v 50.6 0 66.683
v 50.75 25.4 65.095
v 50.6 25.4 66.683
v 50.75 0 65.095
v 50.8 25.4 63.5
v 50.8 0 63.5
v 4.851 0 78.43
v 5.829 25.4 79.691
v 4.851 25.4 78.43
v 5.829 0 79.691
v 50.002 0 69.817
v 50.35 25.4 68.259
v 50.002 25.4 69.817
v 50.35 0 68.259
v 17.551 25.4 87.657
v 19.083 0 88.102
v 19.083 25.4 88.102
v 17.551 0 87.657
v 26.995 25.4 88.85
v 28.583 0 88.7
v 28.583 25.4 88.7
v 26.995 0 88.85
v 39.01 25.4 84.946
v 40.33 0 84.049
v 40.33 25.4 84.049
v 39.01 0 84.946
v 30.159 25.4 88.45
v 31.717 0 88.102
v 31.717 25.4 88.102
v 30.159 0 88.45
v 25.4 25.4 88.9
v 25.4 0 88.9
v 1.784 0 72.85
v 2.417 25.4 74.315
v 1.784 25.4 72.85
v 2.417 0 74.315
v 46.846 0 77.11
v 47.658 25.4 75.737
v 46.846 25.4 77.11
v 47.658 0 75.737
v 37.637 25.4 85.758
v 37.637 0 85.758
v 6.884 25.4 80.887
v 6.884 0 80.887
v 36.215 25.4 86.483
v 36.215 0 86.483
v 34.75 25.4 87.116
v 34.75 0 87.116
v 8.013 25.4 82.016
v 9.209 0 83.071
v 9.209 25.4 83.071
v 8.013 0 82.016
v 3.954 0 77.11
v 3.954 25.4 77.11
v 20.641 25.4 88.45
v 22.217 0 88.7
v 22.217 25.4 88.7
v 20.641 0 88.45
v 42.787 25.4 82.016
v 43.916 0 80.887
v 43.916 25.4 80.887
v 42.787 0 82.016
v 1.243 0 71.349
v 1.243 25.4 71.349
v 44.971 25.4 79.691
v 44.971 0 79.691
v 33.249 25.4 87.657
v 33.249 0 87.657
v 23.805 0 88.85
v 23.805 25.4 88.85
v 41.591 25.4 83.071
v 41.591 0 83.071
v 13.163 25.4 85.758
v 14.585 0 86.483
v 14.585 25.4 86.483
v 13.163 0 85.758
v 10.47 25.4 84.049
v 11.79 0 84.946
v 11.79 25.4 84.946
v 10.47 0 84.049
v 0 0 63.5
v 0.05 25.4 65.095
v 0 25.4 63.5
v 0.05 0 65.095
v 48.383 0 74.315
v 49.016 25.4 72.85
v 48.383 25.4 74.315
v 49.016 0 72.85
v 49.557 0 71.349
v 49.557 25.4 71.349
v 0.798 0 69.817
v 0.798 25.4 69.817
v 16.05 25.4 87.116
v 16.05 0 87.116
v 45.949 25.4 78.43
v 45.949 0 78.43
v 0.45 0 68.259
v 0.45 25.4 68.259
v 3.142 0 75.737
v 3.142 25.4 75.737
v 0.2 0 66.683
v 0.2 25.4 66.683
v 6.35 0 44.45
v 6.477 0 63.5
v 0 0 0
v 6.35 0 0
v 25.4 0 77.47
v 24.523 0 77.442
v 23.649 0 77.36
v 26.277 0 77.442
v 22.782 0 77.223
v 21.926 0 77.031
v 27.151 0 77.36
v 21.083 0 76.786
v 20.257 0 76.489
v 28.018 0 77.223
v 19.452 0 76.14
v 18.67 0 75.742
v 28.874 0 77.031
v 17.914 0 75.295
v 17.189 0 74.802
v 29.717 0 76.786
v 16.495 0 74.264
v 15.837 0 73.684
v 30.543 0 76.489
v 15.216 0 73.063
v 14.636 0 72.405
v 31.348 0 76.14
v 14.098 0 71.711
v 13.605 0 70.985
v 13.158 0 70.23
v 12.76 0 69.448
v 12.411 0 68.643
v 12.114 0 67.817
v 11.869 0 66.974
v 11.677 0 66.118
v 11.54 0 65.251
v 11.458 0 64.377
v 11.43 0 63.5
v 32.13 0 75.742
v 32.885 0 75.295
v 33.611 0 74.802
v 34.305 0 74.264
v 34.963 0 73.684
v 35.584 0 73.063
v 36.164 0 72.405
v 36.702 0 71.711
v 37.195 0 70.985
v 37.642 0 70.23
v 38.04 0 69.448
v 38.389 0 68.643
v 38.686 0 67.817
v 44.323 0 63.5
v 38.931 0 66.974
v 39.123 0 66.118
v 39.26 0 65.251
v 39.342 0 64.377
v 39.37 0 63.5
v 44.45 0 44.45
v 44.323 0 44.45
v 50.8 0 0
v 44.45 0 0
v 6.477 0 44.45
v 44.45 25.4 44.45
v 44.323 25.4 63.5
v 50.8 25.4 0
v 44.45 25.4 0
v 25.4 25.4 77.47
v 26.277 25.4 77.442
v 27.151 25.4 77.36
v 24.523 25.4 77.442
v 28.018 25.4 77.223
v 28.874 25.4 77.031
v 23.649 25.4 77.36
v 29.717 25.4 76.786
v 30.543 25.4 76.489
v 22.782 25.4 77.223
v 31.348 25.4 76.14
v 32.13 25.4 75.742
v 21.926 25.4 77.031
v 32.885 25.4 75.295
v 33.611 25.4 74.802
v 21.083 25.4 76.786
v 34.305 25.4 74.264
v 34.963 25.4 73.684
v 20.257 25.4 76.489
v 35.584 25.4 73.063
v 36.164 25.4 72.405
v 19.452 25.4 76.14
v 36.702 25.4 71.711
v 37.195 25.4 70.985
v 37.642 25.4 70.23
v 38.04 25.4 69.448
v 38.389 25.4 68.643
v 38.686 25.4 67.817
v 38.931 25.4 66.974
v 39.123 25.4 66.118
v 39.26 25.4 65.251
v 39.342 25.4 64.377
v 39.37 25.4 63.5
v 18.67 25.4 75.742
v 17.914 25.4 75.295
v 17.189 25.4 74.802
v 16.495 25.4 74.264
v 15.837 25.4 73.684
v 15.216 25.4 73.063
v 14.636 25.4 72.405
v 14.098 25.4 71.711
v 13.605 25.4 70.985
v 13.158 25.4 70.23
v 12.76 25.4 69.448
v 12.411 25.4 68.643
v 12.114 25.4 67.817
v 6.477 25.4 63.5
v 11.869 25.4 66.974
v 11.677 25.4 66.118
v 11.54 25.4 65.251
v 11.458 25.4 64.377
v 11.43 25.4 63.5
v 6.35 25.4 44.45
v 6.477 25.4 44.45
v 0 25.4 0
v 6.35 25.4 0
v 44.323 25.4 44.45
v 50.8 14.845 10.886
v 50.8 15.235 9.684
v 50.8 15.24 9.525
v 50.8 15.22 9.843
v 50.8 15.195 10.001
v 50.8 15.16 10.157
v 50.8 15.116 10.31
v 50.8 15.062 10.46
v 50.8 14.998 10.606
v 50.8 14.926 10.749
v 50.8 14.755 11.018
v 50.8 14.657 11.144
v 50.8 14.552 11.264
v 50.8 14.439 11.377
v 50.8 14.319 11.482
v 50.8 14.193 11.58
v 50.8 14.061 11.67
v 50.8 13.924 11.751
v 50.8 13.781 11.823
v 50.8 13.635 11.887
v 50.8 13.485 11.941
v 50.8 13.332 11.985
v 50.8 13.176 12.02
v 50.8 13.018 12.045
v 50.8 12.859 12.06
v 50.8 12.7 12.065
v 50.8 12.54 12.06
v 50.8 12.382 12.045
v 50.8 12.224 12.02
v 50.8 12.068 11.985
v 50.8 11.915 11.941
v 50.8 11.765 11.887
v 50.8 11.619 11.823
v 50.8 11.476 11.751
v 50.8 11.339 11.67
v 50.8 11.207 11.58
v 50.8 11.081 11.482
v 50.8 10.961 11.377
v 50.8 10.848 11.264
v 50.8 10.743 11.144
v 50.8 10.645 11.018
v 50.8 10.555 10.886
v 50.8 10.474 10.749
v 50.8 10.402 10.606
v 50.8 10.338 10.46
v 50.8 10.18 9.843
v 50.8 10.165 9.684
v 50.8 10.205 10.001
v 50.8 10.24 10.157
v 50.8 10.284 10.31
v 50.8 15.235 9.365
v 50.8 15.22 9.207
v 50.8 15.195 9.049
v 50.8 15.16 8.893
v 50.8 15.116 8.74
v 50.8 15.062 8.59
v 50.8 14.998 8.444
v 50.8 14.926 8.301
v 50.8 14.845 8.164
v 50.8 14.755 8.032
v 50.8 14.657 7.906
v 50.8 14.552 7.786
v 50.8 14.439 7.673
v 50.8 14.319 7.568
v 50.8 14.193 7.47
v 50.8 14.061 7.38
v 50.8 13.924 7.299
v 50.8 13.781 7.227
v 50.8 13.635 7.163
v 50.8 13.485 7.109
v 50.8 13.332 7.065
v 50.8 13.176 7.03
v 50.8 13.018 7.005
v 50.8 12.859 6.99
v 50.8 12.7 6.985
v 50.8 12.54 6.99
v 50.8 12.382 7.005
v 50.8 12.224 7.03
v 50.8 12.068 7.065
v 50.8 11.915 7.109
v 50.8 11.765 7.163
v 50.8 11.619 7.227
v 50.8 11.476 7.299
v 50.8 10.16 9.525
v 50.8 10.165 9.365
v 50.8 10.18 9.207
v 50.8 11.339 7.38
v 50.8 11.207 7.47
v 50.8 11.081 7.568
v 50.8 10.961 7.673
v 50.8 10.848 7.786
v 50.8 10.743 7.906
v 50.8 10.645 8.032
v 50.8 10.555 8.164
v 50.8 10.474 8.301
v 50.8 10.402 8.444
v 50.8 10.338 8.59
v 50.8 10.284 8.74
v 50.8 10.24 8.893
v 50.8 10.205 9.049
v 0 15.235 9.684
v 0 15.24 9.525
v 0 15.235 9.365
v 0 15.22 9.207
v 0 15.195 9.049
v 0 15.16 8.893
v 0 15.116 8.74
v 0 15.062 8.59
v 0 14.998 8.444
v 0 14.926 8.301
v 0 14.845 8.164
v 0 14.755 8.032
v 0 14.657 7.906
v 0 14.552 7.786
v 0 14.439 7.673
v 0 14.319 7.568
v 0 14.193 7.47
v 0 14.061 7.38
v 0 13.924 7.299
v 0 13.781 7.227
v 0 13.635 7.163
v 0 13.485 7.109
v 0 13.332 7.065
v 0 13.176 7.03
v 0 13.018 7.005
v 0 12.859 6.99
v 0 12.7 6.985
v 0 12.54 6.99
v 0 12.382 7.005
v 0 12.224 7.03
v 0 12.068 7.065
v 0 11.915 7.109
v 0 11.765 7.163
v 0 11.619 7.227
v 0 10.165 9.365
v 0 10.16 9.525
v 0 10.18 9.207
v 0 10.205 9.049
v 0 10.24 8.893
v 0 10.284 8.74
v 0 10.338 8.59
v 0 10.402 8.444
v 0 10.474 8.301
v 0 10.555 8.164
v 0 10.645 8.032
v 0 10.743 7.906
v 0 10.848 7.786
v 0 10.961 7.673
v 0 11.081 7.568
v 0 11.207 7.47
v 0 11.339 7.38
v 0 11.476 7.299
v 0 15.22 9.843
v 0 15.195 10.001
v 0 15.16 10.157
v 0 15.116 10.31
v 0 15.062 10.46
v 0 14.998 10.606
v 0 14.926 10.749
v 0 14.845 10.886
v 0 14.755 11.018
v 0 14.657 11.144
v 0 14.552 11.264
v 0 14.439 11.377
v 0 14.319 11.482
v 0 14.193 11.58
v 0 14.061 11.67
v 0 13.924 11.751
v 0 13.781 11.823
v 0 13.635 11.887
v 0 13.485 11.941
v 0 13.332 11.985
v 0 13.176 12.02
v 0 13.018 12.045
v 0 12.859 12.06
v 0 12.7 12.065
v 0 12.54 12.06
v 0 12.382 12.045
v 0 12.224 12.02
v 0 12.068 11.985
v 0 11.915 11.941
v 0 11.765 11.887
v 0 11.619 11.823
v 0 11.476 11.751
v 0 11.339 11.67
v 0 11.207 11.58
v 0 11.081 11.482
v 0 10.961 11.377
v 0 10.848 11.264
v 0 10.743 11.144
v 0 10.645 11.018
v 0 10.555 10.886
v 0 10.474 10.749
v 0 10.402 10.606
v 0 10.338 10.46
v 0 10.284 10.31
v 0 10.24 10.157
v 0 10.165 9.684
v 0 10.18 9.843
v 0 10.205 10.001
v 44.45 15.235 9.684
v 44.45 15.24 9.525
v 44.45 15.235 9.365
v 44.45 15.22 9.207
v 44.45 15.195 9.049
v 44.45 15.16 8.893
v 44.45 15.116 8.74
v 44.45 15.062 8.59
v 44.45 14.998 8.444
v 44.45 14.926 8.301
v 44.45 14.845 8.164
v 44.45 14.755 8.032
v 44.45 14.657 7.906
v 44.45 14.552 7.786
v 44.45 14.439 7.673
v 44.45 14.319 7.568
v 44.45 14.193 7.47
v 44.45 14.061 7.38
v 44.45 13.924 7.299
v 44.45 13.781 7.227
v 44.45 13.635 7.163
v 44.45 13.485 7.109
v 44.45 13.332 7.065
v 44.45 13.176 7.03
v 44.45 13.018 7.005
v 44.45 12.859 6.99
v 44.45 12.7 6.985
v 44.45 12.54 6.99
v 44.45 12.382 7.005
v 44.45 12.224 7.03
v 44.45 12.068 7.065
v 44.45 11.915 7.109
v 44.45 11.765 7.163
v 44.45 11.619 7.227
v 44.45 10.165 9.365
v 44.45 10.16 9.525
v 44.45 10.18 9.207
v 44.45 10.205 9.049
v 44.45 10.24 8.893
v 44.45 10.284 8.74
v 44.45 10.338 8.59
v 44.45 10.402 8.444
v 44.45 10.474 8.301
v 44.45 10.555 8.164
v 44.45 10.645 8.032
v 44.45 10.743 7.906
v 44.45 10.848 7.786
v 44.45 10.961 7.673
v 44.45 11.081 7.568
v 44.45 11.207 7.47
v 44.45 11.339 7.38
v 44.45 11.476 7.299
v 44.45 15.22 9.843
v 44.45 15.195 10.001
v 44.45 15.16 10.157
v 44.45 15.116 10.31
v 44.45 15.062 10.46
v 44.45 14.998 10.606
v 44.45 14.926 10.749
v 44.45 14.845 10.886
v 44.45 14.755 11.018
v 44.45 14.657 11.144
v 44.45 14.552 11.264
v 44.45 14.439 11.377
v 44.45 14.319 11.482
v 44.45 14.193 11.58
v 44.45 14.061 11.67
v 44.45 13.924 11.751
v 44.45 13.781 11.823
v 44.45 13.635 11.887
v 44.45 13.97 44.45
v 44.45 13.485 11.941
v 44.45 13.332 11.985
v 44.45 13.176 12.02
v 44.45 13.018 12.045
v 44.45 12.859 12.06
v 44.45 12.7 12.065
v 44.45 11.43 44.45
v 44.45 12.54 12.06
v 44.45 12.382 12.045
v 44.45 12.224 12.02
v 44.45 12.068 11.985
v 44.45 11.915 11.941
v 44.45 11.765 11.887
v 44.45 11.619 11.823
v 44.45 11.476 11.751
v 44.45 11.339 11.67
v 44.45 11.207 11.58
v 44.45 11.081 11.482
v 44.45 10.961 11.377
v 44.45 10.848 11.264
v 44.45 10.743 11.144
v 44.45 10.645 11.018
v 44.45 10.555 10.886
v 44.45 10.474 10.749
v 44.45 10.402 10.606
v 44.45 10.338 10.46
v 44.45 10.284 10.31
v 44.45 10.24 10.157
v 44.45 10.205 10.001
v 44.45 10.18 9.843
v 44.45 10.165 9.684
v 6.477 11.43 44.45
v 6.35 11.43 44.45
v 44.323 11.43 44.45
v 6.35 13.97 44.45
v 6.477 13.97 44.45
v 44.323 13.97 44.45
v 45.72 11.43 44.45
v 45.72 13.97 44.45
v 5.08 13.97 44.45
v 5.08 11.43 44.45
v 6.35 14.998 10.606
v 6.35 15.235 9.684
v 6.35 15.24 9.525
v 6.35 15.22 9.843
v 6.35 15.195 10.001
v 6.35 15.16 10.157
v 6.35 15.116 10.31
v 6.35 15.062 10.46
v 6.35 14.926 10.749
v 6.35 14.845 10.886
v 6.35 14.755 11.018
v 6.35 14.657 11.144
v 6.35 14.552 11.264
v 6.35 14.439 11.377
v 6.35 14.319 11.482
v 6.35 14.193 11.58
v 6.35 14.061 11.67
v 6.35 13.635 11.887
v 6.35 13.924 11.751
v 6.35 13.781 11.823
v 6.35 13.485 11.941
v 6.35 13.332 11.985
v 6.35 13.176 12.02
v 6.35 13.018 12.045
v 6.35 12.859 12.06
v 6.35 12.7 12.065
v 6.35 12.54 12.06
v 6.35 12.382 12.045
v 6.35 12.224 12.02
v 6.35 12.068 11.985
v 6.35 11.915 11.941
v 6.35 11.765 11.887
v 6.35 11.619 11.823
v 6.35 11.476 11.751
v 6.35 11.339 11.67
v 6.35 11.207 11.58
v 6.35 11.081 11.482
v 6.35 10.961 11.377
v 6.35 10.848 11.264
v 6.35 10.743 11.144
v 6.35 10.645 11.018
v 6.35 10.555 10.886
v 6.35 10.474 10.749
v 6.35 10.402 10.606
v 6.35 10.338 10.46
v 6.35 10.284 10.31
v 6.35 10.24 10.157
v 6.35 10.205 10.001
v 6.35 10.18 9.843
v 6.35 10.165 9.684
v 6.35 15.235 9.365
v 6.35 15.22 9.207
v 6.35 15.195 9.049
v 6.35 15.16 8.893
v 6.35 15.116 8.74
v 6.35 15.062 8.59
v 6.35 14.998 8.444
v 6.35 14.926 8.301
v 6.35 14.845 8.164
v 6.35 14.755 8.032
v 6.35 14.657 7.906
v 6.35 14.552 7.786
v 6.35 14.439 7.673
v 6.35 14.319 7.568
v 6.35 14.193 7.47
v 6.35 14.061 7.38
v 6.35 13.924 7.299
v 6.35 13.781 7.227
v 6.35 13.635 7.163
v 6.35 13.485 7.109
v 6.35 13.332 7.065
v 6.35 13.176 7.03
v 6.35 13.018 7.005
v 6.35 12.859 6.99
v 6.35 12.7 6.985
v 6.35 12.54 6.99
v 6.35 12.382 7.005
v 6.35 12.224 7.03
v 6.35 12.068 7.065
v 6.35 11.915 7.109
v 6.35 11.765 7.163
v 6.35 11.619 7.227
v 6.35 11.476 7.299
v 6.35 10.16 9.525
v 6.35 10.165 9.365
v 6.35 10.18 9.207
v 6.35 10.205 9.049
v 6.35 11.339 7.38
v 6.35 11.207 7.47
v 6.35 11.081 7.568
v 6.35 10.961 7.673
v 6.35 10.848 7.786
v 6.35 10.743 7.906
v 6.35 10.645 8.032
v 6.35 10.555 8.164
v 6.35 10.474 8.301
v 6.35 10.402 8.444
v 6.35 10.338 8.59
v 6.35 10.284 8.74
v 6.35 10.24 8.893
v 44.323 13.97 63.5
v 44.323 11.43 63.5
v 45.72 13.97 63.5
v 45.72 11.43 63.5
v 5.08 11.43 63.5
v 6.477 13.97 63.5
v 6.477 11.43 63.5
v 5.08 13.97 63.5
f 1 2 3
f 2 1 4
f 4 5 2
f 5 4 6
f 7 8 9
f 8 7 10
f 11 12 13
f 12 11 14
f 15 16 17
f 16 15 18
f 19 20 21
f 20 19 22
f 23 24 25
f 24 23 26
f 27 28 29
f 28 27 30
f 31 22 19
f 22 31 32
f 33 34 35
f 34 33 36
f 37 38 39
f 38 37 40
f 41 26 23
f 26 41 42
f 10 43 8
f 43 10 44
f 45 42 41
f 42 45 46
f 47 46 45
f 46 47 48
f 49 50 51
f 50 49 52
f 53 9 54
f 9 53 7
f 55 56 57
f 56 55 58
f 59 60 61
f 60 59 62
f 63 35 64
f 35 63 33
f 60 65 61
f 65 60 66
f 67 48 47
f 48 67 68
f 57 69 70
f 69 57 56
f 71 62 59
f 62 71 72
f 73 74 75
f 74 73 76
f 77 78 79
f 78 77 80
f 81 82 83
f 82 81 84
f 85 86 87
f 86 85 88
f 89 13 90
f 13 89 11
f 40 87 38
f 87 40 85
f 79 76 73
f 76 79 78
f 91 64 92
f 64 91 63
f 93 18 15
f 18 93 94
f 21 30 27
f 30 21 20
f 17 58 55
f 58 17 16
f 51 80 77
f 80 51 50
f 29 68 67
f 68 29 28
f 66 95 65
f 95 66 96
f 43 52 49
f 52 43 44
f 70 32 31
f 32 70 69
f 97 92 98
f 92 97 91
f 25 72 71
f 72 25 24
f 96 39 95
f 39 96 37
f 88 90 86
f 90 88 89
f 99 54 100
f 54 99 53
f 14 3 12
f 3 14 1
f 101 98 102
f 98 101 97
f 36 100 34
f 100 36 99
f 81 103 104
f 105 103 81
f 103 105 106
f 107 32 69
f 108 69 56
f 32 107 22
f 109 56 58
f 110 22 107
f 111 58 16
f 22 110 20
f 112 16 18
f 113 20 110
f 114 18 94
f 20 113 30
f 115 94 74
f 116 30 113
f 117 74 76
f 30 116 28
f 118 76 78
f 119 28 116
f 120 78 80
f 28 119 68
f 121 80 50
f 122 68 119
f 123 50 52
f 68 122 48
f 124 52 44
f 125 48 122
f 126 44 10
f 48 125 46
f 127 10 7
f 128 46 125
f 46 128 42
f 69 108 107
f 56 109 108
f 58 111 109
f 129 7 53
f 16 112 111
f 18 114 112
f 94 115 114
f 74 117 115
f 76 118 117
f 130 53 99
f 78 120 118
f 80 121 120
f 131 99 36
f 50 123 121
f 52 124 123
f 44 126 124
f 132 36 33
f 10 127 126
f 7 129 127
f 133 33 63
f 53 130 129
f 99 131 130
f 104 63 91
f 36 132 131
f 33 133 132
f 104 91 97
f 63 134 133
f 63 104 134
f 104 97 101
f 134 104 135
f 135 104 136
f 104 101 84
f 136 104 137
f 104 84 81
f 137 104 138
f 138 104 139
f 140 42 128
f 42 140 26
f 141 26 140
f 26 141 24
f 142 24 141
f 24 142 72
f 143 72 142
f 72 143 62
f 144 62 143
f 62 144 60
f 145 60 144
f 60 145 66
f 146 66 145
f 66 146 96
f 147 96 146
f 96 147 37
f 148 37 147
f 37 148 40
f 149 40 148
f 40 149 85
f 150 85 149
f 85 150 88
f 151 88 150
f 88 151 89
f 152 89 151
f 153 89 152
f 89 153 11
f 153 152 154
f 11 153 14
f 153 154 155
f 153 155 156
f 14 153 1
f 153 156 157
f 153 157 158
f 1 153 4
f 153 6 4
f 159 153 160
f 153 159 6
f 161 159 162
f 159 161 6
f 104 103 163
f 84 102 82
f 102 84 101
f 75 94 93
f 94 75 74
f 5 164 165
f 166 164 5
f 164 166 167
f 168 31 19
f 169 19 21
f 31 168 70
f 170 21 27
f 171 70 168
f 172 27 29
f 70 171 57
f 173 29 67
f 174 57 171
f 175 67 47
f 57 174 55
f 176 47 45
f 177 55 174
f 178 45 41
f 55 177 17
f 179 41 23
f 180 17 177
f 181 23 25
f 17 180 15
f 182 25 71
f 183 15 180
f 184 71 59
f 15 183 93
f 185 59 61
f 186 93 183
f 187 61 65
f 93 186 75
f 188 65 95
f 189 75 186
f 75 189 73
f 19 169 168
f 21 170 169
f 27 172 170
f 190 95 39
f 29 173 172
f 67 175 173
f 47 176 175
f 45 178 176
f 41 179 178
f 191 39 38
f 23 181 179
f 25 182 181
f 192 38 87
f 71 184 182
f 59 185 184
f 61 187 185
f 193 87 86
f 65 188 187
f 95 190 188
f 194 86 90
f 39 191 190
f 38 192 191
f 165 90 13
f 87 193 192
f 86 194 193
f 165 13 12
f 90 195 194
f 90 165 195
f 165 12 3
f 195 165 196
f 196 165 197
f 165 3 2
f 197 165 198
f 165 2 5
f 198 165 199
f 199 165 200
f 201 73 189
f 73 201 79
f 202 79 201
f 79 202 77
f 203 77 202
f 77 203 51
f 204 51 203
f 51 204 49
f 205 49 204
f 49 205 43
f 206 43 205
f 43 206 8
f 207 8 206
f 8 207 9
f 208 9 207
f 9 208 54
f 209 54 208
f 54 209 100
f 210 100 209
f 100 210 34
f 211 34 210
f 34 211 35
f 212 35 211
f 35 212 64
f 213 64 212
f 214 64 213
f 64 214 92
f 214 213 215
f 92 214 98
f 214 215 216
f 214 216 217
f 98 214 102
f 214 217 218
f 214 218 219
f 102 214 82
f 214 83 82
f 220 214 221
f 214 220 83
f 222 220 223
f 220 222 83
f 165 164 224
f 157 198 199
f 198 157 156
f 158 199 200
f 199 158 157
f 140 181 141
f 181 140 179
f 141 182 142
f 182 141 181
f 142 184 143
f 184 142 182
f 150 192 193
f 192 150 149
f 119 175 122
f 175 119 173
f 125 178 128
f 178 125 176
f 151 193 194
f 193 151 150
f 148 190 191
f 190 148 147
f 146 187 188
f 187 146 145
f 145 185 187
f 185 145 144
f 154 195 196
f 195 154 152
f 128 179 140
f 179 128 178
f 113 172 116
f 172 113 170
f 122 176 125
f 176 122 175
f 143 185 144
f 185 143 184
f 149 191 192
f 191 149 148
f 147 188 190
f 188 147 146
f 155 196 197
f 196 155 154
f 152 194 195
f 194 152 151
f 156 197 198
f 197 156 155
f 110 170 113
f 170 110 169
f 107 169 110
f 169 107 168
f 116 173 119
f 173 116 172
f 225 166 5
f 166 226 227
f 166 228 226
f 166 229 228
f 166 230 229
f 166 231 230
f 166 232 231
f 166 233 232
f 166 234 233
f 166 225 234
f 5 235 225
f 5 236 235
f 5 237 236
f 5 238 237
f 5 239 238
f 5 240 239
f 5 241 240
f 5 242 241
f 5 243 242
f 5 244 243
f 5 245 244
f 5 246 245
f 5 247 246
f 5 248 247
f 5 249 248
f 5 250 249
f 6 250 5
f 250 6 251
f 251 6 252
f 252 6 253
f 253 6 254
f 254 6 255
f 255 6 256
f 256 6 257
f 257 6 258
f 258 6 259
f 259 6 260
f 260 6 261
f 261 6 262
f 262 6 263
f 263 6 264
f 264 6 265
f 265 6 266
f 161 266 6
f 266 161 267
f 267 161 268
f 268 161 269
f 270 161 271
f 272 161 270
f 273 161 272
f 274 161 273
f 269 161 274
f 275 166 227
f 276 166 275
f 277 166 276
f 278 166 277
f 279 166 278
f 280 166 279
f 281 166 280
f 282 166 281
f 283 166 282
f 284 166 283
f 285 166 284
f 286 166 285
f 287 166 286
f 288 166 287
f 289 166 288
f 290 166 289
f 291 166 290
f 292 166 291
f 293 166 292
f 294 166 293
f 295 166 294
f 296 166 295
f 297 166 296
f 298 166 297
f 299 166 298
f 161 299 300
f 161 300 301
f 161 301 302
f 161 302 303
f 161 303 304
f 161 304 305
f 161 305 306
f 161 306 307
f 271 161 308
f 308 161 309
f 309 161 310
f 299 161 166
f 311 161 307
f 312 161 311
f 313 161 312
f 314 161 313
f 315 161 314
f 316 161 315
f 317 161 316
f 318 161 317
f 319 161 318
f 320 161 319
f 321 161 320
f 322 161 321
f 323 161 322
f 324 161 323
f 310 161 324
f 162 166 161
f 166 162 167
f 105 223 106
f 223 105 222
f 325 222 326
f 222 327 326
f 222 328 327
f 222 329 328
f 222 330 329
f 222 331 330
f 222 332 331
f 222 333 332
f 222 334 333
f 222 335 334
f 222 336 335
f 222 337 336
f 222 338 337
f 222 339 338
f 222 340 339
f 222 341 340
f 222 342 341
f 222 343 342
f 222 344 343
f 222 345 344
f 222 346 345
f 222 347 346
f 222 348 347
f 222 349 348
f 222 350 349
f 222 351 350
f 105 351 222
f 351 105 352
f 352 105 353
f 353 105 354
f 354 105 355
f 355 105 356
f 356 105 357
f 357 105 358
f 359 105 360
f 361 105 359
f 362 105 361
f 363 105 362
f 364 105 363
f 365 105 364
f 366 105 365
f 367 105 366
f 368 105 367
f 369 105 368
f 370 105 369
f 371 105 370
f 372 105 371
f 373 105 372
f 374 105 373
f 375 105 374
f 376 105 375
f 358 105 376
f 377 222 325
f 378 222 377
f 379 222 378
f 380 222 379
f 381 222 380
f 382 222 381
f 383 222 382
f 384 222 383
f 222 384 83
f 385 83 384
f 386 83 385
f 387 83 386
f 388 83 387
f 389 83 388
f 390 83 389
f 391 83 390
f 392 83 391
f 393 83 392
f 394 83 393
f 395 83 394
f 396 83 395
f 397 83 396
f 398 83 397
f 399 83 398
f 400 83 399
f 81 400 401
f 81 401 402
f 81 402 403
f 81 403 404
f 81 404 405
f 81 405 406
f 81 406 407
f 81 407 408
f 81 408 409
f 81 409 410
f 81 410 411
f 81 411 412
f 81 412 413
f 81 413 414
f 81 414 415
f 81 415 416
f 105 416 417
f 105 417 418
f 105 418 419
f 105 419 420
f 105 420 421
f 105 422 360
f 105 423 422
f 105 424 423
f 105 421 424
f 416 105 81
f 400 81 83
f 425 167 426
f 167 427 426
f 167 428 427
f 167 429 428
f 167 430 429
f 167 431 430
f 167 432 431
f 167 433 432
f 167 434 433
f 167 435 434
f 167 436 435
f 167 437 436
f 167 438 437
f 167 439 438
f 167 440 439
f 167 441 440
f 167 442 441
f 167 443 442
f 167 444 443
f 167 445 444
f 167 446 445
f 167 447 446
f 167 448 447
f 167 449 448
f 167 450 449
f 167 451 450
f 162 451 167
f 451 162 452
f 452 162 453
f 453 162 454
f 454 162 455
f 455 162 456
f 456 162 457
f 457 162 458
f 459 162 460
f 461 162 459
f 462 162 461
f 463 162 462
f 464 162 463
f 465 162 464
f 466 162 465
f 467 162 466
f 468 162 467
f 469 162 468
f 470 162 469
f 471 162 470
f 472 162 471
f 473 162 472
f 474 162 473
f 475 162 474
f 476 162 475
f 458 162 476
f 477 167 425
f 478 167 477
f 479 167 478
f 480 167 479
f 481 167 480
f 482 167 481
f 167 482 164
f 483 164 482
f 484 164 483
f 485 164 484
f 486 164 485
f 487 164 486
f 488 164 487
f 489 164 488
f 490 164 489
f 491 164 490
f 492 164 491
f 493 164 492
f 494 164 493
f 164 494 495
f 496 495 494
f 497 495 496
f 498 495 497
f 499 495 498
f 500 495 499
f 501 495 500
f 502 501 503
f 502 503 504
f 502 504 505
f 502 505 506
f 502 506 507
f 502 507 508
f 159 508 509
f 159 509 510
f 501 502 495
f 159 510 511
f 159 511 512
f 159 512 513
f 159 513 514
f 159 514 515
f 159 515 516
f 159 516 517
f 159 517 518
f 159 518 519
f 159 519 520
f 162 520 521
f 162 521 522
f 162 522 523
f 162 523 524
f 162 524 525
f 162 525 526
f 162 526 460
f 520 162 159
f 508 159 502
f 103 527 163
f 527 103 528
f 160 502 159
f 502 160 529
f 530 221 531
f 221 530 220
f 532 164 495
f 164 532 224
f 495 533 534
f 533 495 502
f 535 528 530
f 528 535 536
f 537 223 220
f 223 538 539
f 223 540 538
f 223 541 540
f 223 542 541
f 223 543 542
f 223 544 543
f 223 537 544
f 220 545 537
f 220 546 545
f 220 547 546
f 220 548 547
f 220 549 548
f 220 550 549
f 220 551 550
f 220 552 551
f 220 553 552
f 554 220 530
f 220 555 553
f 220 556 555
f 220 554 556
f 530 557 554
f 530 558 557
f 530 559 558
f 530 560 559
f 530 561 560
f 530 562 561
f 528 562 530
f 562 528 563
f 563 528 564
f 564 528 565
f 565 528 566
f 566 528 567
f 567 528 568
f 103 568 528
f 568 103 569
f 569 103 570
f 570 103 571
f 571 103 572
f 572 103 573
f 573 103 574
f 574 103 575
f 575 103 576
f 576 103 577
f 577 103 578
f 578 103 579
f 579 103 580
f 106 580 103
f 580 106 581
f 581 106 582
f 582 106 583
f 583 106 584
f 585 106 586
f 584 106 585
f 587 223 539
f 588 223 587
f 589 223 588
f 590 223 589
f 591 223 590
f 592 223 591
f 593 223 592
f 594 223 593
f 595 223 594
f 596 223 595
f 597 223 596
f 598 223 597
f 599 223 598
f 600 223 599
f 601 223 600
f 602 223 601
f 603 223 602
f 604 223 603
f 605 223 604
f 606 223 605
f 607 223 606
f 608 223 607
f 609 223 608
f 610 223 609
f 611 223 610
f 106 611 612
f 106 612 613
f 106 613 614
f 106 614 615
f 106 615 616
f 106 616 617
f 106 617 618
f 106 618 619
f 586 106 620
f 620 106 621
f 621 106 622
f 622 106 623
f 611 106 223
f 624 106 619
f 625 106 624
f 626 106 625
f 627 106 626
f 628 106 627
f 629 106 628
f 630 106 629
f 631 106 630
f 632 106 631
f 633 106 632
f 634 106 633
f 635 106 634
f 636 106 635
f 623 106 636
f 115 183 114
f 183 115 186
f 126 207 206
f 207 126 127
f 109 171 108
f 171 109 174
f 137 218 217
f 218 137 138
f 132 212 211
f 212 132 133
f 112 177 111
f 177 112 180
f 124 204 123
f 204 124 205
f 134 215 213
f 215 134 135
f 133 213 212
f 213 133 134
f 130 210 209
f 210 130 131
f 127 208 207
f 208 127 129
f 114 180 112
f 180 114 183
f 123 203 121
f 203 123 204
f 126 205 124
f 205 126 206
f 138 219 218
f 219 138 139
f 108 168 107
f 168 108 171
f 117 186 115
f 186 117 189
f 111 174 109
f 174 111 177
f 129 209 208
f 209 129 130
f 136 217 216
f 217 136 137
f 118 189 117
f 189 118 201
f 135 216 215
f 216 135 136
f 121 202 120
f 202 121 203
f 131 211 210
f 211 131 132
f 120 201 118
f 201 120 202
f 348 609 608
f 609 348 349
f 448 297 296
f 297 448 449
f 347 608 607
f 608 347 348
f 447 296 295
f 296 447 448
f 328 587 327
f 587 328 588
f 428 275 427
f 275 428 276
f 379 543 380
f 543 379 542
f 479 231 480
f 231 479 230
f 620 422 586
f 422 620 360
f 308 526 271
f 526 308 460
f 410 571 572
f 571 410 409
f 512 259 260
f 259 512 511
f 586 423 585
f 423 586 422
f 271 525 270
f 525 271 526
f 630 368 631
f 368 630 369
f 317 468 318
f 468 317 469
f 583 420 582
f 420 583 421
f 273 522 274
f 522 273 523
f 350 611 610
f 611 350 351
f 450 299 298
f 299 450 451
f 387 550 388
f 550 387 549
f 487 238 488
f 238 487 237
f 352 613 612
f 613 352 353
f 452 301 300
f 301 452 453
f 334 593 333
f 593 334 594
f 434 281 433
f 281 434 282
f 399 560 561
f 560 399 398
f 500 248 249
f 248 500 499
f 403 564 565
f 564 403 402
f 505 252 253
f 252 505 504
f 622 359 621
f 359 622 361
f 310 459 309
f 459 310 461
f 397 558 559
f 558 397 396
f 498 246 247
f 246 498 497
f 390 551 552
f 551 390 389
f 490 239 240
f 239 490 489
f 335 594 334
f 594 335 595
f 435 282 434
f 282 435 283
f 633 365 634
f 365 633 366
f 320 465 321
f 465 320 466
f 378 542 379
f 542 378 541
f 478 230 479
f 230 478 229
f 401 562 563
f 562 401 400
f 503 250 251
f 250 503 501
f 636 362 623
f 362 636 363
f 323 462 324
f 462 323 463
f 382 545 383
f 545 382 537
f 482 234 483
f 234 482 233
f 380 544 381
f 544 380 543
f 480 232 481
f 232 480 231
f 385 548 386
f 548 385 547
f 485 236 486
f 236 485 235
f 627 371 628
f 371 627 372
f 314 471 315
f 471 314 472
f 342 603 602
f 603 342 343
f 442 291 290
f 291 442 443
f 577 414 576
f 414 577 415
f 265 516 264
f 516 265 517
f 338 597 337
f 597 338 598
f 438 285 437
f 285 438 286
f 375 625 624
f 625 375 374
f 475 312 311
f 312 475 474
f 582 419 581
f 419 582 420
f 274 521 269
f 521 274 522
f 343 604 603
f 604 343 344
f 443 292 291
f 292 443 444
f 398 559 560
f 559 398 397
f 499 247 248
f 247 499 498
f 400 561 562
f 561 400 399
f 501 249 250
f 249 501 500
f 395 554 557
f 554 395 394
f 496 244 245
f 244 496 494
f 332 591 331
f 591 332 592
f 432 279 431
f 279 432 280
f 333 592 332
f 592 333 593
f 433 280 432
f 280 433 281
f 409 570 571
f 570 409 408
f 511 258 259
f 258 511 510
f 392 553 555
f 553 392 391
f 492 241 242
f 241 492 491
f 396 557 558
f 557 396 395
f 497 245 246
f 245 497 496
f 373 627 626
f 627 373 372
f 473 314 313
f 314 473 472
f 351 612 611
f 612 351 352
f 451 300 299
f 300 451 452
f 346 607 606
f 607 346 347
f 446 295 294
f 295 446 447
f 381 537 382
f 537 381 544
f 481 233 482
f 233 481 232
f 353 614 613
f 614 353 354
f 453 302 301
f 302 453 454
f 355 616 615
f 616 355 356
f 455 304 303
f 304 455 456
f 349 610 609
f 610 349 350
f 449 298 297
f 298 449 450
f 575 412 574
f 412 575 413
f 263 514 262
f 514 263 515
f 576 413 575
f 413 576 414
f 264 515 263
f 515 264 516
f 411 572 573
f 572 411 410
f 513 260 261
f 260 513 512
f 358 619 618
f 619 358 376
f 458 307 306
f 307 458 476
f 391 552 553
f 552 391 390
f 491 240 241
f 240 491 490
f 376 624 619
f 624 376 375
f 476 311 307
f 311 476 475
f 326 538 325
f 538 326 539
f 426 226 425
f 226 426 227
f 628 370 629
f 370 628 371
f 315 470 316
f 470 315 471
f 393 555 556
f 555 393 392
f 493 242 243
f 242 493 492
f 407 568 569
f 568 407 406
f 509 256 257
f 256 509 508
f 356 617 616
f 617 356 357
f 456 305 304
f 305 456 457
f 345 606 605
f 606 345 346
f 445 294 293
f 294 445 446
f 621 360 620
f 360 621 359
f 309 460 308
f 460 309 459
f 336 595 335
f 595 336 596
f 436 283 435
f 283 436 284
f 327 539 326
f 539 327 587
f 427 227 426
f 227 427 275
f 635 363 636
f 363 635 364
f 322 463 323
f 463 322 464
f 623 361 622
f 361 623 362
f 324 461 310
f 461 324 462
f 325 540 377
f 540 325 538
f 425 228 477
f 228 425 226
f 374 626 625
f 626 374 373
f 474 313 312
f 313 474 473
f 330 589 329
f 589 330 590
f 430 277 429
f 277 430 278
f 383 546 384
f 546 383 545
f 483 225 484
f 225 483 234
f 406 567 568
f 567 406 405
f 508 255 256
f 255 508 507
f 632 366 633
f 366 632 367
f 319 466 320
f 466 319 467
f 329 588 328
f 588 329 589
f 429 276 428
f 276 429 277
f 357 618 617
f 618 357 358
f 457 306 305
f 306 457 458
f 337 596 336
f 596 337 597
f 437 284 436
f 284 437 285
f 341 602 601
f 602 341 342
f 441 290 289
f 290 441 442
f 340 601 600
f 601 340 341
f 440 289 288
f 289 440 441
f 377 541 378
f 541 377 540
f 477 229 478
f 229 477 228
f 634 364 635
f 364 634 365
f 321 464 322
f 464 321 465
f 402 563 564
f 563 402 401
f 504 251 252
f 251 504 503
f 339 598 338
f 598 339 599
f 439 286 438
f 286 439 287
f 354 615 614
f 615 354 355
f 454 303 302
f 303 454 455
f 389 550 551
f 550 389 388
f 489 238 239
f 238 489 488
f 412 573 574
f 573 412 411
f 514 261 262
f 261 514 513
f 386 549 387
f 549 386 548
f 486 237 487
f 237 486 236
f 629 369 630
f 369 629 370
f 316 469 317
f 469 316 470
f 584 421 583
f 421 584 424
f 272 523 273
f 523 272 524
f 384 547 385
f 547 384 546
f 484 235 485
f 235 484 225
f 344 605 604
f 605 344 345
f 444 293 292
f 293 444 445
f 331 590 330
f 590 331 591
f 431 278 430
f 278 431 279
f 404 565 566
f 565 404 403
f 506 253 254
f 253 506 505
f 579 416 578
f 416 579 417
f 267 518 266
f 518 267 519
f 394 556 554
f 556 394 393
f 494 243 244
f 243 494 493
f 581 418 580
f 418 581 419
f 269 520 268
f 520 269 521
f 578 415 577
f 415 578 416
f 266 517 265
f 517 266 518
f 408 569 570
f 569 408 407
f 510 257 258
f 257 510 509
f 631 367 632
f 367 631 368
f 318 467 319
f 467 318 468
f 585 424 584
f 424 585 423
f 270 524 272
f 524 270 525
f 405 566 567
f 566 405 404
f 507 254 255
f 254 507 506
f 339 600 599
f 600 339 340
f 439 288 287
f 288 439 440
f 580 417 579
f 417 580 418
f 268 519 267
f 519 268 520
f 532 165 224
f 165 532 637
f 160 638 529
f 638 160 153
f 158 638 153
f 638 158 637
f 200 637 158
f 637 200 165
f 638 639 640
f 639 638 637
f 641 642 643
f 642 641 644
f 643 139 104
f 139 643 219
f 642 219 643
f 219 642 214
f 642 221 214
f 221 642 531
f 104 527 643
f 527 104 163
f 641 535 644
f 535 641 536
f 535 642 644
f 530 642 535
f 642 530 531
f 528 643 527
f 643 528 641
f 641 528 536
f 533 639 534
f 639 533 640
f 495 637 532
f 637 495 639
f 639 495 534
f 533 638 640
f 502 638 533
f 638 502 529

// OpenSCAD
wall_thickness = .25;
board_thickness = 1.5;
hinge_width = 1;
hinge_depth = 1.5;
pvc_od = 1.1; //1.060;
thickness = wall_thickness*2 + board_thickness;
radius = thickness/2;

module screwhole()
{
    translate([thickness/2,hinge_width/2,0]) {
        union() {
            cylinder(h=hinge_depth+radius-pvc_od/2, r=.1, $fn=100);
            translate([0,0, hinge_depth+radius-pvc_od/2-.124])
                cylinder(h=.25, r=.140, $fn=100);
        }
    }
}

module screwhole2()
{
    translate([0,hinge_width/2,hinge_depth/4]) {
        rotate([0,90,0]) {
            cylinder(h=thickness*2+.2, r=.1, center=true, $fn=100);
        }
    }
}

module hinge() 
{
    difference() {
        union() {
            cube([thickness, hinge_width, hinge_depth+radius]);
            translate([radius,hinge_width/2,hinge_depth+radius]) {
                rotate([90,0,0]) {
                    difference() {
                        cylinder(h=hinge_width, r=radius, center=true, $fn=100);
                        cylinder(h=hinge_width+1, r=pvc_od/2, center=true, $fn=100);
                    };
                };
            };
        }
        // Notch out board
        translate([wall_thickness,-.05,0]) {
            cube([board_thickness, hinge_width+.1, hinge_depth+.25]);
        }
        // Notch out PVC hole
        translate([radius, hinge_width/2, hinge_depth+radius]) {
            rotate([90,0,0])
                cylinder(h=hinge_width+1, r=pvc_od/2, center=true, $fn=100);
        }
        // Notch out vertical screwhole
        screwhole();
        // Notch out the horizontal screwholes
        screwhole2();
    }
}

module chopper()
{
    translate([wall_thickness+.005, -.5, 0]) {
        cube([board_thickness-.01, hinge_width+1, hinge_depth+radius]);
    }
    notch_size=.1;
    translate([wall_thickness-notch_size/2,hinge_width/2-notch_size/2,hinge_depth+.25]) {
        cube([notch_size,notch_size,radius-.25]);
    }
    translate([wall_thickness-notch_size/2+board_thickness,hinge_width/2-notch_size/2,hinge_depth+.25]) {
        cube([notch_size,notch_size,radius-.25]);
    }
}

scale([25.4, 25.4, 25.4]) {
    do_shell=1;
    do_cradle=0;
    
    if (do_shell) {
        difference() {
            hinge();
            chopper();
        }
    } 
    if (do_cradle) {
        intersection() {
            hinge();
            chopper();
        }
    }
}
